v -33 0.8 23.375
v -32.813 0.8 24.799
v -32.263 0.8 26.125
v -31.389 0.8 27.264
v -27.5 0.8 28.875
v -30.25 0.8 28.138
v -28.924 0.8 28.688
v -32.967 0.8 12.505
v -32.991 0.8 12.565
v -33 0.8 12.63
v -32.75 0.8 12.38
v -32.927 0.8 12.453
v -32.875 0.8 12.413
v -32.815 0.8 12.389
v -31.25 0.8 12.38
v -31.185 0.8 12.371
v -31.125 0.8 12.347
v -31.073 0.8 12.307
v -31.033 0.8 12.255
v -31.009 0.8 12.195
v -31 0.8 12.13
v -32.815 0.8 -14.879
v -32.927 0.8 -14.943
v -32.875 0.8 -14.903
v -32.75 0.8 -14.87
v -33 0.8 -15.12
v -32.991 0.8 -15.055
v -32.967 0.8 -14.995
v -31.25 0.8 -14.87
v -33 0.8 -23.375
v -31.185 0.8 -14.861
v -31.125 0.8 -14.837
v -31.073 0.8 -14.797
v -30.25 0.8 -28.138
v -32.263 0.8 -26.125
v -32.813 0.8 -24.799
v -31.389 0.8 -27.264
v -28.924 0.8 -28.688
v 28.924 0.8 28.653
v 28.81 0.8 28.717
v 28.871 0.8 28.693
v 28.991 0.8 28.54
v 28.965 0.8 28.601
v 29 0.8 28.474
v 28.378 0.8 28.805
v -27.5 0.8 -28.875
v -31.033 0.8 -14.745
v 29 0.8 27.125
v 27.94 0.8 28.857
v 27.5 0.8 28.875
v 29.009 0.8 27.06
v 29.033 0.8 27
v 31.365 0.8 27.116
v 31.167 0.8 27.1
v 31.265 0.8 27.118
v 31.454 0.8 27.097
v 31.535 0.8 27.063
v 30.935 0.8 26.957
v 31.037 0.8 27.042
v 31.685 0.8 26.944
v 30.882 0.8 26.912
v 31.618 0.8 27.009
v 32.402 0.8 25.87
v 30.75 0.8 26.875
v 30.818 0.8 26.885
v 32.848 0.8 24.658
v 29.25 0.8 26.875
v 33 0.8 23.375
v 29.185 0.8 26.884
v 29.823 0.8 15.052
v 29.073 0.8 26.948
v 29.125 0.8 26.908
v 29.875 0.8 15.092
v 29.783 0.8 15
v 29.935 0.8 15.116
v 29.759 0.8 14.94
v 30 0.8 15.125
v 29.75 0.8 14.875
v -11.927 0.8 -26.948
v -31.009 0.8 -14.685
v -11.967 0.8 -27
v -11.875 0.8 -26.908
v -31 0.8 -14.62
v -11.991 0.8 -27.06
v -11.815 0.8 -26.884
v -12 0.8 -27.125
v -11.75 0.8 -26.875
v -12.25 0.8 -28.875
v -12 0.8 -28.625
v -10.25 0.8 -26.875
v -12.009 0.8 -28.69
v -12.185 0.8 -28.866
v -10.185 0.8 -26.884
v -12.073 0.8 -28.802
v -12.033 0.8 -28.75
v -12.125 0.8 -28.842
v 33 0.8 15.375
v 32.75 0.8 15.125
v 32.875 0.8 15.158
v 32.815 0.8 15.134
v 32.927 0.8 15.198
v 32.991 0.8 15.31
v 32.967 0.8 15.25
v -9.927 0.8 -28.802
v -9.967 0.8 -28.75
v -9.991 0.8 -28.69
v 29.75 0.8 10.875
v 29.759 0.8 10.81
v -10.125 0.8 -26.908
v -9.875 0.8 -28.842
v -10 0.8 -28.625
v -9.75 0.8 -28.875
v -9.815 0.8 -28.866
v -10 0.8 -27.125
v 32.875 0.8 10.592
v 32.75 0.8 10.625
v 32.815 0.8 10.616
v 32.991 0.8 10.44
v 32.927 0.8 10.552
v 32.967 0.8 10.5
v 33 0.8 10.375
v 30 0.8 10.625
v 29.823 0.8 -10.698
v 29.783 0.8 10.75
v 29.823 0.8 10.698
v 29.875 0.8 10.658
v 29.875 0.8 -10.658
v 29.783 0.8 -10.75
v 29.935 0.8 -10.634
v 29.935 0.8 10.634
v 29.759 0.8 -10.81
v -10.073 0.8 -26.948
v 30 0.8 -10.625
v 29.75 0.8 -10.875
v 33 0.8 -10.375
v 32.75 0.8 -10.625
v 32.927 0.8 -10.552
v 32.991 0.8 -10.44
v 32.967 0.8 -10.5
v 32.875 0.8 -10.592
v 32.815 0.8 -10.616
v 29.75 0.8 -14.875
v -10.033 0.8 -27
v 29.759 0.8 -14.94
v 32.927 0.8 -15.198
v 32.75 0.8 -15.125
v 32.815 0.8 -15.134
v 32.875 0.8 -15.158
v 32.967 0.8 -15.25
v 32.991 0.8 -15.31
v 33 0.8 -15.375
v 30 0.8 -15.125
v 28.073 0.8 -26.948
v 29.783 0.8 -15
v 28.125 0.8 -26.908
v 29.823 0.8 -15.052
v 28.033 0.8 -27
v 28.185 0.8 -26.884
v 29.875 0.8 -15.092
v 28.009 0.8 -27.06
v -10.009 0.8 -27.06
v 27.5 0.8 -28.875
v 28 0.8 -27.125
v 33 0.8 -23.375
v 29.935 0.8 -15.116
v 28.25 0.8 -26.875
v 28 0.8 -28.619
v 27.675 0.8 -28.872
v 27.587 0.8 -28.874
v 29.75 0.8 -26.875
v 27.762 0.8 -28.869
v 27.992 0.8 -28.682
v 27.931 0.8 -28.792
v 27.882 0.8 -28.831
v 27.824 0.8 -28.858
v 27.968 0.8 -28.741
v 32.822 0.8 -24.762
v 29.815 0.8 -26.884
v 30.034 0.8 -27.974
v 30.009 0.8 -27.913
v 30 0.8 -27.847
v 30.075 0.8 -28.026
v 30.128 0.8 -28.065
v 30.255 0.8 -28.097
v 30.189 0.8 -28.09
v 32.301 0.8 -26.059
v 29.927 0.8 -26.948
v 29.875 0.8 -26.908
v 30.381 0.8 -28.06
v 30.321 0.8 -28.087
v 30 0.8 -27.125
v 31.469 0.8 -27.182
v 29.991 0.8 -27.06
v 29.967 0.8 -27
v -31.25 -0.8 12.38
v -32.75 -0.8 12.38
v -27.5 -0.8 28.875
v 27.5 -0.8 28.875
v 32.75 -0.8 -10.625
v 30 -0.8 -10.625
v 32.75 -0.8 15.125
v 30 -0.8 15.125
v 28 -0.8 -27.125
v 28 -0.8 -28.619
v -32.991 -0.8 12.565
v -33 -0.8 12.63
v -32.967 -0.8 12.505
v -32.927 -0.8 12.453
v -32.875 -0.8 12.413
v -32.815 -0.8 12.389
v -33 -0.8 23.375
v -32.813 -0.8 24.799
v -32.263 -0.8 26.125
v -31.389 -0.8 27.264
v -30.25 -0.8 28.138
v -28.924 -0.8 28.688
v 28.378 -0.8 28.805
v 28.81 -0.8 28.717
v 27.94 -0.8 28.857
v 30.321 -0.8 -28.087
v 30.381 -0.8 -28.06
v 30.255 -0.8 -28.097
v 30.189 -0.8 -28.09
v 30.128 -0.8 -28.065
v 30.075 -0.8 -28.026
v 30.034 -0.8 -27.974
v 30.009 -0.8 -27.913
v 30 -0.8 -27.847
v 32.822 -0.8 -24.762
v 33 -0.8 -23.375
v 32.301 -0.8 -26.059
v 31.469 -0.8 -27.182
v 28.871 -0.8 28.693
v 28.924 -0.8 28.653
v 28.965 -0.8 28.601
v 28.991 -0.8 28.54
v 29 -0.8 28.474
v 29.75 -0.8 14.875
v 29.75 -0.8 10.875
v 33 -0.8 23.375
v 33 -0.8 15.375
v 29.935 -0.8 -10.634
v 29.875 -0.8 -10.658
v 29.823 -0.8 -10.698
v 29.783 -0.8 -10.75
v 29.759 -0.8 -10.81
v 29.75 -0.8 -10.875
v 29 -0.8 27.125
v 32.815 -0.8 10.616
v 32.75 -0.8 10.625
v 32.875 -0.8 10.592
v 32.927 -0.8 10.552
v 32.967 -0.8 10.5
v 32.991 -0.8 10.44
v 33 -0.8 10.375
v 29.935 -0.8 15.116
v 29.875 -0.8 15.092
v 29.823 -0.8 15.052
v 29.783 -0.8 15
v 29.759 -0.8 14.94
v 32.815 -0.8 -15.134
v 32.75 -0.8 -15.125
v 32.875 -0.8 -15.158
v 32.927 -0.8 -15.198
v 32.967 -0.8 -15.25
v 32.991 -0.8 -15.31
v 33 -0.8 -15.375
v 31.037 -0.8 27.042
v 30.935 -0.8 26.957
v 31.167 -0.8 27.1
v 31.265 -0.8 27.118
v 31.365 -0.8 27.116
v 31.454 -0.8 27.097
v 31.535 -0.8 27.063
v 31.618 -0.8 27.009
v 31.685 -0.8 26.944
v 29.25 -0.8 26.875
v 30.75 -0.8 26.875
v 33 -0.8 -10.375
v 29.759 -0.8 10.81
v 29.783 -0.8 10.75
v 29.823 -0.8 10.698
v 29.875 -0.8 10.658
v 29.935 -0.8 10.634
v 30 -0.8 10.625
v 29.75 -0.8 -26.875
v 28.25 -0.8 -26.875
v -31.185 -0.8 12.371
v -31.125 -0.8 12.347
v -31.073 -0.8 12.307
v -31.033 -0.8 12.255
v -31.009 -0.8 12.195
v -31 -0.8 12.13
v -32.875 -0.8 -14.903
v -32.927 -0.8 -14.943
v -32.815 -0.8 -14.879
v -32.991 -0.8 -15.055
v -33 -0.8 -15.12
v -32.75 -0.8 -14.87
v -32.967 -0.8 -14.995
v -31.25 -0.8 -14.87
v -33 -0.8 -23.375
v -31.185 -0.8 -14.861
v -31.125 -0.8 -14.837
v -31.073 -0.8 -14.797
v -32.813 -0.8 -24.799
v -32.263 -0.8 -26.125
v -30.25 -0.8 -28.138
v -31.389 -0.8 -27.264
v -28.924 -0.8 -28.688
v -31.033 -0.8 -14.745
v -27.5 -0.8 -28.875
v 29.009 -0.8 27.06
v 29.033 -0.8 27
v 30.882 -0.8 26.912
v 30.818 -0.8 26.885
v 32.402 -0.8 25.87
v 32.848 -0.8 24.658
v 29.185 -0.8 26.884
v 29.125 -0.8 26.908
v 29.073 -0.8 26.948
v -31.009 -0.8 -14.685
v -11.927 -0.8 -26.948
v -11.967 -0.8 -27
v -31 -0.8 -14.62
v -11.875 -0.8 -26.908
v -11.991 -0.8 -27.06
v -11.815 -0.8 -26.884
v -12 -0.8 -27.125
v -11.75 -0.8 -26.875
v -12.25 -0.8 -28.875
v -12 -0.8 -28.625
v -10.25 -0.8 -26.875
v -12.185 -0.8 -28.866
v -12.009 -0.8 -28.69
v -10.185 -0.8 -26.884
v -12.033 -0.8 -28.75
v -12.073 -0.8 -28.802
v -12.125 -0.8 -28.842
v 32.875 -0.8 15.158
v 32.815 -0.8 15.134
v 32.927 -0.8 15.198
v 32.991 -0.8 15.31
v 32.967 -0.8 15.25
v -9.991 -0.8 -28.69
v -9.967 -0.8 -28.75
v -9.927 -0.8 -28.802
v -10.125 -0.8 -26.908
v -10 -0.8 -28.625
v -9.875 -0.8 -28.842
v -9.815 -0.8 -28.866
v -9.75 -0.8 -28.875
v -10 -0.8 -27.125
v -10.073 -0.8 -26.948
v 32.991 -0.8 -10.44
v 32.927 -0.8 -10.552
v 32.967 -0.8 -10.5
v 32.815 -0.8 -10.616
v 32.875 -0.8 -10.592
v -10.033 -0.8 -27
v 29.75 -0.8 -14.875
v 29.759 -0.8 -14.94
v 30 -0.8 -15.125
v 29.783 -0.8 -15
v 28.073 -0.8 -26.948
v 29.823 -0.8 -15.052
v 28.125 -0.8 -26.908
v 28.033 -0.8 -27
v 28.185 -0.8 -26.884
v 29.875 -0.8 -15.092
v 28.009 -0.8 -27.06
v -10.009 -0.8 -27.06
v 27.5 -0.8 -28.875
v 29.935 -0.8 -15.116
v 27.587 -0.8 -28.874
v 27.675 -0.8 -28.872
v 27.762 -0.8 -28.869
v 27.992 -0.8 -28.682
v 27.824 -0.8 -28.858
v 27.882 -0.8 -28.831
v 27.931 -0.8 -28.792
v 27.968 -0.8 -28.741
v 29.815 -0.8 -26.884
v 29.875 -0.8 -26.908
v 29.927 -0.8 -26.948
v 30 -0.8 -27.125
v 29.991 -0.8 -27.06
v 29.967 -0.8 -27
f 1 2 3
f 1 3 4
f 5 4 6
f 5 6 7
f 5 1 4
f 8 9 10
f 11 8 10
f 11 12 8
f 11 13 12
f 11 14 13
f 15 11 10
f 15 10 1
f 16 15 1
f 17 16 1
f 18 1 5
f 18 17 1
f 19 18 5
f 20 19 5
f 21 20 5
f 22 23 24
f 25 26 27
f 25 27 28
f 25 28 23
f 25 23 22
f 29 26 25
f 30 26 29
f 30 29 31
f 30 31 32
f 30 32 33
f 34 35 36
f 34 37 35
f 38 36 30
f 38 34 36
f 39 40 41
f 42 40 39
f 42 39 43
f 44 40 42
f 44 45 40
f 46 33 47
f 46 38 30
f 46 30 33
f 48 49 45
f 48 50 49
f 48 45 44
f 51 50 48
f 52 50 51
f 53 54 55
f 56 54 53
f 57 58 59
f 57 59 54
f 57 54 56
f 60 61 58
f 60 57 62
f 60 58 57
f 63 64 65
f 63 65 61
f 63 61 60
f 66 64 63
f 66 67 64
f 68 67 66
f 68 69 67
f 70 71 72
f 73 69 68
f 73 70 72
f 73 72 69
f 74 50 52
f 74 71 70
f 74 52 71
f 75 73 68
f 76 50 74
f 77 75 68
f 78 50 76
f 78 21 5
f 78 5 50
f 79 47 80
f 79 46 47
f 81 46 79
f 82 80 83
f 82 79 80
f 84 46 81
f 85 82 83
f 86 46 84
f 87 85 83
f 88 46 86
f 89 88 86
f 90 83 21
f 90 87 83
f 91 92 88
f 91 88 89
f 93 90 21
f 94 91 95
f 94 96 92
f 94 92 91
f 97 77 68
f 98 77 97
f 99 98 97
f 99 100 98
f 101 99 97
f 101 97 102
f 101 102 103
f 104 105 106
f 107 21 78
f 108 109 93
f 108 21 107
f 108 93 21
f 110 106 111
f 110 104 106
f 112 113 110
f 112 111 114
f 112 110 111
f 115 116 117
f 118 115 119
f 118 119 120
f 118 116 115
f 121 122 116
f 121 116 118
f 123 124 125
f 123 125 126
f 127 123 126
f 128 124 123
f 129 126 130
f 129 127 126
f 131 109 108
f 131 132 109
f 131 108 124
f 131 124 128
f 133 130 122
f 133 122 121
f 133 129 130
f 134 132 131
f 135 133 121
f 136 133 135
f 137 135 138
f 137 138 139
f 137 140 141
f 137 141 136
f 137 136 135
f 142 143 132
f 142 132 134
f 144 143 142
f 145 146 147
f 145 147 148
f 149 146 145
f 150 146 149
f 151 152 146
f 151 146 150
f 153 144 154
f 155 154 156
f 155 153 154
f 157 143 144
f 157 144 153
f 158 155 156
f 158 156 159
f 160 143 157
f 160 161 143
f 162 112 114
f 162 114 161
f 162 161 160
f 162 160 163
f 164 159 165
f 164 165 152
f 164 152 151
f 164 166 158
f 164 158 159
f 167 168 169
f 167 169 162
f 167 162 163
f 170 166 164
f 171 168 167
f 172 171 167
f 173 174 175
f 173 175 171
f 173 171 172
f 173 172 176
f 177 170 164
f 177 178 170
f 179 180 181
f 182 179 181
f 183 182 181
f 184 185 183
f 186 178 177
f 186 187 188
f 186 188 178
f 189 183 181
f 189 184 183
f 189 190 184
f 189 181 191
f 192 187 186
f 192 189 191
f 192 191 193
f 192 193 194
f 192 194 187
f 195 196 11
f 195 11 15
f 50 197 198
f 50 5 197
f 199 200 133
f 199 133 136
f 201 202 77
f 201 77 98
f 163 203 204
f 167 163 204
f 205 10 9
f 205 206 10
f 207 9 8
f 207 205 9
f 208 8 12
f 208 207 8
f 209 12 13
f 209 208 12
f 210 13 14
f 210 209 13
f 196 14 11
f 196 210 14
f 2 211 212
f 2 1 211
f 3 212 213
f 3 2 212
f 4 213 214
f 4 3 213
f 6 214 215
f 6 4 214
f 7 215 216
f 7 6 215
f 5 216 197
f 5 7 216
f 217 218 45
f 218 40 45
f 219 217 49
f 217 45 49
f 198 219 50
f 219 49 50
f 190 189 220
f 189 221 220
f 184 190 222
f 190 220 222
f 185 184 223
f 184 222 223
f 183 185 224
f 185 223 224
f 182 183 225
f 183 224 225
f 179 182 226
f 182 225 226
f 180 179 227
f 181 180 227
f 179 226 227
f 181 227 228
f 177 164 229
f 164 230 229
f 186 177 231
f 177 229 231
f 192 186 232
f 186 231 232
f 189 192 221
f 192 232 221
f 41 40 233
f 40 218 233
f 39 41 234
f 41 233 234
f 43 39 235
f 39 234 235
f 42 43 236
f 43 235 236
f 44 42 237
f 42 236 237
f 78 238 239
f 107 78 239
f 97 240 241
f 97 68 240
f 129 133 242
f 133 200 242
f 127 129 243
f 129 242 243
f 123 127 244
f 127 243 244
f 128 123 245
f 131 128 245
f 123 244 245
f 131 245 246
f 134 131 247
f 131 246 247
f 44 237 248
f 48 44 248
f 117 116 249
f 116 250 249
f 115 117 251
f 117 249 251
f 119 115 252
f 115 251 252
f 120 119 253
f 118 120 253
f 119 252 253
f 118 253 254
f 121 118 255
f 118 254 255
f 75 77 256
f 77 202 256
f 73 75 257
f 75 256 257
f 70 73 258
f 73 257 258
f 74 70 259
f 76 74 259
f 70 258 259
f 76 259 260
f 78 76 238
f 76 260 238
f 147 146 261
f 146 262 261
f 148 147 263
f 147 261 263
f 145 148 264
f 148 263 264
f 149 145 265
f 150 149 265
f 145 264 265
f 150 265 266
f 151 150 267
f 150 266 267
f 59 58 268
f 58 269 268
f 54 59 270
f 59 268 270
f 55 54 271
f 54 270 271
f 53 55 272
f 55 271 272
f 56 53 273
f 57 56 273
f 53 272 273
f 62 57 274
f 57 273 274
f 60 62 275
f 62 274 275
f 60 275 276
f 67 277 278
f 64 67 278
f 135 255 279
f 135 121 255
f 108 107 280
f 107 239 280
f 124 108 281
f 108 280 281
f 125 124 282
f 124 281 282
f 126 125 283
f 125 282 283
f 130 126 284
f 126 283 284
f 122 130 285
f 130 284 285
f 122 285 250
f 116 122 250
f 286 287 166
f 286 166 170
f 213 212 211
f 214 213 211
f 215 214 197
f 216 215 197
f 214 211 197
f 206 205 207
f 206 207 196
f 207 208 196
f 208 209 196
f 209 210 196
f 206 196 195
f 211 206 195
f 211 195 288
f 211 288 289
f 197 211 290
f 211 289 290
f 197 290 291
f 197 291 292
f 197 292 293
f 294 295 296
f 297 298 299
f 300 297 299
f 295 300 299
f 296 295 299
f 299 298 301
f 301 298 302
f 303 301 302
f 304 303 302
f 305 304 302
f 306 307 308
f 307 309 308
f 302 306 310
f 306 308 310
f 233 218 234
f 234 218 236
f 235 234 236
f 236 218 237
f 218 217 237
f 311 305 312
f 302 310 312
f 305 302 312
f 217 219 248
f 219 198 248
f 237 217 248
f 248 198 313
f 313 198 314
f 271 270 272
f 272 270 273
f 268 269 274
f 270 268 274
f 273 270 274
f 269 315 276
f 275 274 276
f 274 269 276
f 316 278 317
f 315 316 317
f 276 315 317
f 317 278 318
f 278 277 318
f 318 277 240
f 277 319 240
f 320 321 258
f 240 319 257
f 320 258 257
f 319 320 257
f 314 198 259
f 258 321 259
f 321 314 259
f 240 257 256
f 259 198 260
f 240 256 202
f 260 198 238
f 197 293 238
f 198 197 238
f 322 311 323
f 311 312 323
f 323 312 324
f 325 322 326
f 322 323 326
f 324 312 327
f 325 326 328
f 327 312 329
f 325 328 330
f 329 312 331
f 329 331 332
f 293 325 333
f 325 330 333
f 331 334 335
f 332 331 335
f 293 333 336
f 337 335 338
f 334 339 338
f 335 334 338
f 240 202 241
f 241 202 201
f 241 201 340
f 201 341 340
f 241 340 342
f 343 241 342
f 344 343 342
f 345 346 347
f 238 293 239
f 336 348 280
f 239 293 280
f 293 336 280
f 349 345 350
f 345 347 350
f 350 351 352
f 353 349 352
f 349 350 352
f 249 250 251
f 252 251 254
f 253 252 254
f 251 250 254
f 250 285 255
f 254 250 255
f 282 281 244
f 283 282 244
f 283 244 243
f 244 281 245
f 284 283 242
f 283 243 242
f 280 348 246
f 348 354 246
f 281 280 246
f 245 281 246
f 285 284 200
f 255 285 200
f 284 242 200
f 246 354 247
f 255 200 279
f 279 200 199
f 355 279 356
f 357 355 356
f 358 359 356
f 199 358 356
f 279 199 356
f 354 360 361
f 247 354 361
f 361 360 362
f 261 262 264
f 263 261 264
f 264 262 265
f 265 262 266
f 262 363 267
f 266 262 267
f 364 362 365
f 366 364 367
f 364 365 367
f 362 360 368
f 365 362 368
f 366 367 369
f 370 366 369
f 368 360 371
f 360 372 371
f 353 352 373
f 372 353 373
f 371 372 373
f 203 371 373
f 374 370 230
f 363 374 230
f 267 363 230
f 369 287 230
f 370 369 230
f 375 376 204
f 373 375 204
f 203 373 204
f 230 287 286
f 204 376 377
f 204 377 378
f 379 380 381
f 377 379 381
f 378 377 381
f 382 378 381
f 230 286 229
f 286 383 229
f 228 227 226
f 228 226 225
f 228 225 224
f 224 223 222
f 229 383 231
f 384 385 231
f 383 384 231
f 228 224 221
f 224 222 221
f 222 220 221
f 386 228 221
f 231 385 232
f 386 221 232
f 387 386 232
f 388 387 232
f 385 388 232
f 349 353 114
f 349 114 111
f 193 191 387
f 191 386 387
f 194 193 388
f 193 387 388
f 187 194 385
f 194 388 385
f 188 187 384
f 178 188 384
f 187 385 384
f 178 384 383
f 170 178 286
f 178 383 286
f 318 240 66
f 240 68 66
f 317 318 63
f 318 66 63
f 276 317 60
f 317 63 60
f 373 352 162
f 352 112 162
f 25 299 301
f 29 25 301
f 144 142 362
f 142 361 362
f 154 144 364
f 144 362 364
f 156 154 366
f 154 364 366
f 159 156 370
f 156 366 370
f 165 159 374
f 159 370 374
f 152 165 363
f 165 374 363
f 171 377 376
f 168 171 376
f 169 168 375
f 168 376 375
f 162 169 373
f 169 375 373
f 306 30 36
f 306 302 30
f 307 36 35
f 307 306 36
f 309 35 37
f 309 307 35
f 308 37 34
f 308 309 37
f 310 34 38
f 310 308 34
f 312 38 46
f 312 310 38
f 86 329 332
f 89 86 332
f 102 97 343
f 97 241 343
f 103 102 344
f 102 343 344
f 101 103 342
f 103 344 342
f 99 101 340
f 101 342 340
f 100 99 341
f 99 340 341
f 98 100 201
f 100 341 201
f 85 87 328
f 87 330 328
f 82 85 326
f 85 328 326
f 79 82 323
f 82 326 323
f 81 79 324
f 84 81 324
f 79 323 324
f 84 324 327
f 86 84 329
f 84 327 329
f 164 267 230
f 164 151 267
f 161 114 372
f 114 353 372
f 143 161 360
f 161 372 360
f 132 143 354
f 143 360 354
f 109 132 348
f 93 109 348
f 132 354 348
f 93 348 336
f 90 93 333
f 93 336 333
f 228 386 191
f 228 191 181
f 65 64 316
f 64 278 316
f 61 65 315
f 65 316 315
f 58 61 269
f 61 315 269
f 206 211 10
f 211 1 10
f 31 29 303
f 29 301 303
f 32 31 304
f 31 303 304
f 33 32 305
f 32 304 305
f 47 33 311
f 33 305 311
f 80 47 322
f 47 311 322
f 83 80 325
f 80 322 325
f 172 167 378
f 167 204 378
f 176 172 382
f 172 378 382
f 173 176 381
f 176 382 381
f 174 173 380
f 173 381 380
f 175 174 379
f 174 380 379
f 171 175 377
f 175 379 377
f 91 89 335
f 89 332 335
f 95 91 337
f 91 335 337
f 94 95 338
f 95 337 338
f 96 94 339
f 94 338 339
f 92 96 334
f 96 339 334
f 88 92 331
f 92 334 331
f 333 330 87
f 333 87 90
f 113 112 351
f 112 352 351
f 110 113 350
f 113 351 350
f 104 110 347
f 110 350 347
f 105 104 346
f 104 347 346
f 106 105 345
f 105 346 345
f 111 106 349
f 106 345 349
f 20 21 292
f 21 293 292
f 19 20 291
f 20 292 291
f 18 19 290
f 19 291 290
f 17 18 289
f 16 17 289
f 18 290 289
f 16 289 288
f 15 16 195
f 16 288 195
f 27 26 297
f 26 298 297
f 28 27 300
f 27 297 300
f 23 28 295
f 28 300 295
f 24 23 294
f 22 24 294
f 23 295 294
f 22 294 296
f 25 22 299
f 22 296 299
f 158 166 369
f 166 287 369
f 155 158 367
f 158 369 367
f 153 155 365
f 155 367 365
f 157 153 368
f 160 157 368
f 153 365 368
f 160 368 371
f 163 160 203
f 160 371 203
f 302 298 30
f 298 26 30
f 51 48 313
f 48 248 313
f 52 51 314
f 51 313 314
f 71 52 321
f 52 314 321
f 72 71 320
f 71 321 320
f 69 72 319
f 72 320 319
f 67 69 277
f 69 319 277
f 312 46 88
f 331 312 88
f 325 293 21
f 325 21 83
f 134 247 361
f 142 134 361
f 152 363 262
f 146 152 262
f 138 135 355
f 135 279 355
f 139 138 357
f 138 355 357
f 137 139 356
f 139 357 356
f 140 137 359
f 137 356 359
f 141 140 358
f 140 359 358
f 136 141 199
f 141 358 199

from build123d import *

# Parameters (mm, degrees)
ESQUISSE1_W                  = 66
ESQUISSE1_H                  = 57.75
BOSS_EXTRU_1_DEPTH           = 0.8
CONG_1_R                     = 5.5
ESQUISSE3_W                  = 4
ESQUISSE3_H                  = 27.25
ESQUISSE3_W_2                = 6.5
ESQUISSE3_H_2                = 4.5
ESQUISSE3_W_3                = 2
ESQUISSE3_H_3                = 4
ENL_V_MAT_EXTRU_1_DEPTH      = 1.8
ENL_V_MAT_EXTRU_1_DEPTH_BACK = 1.8
CONG_2_R                     = 0.25
CONG_3_R                     = 0.5


with BuildPart() as part:
    # Esquisse1 → Boss.-Extru.1 (new body, symmetric)
    with BuildSketch(Plane(origin=(0, 0, 0), x_dir=(1, 0, 0), z_dir=(0, 1, 0))):
        Rectangle(ESQUISSE1_W, ESQUISSE1_H)
    extrude(amount=BOSS_EXTRU_1_DEPTH, both=True)

    # Congé1
    cong_1_edges = [part.edges().sort_by_distance(p)[0] for p in [
        (33, 0, 28.875),
        (-33, 0, 28.875),
        (-33, 0, -28.875),
        (33, 0, -28.875),
    ]]
    fillet(cong_1_edges, radius=CONG_1_R)

    # Esquisse3 → Enlèv. mat.-Extru.1 (cut, two sides)
    with BuildSketch(Plane(origin=(0, 0, 0), x_dir=(1, 0, 0), z_dir=(0, 1, 0))) as enl_v_mat_extru_1_sk:
        with Locations((-33, 1.245)):
            Rectangle(ESQUISSE3_W, ESQUISSE3_H)
        with Locations((33, -12.875)):
            Rectangle(ESQUISSE3_W_2, ESQUISSE3_H_2)
        with Locations((-11, 28.875)):
            Rectangle(ESQUISSE3_W_3, ESQUISSE3_H_3)
        with Locations((29, 28.875)):
            Rectangle(ESQUISSE3_W_3, ESQUISSE3_H_3)
        with Locations((30, -28.875)):
            Rectangle(ESQUISSE3_W_3, ESQUISSE3_H_3)
        with Locations((33, 12.875)):
            Rectangle(ESQUISSE3_W_2, ESQUISSE3_H_2)
    extrude(amount=ENL_V_MAT_EXTRU_1_DEPTH, mode=Mode.SUBTRACT)
    extrude(enl_v_mat_extru_1_sk.sketch, amount=-ENL_V_MAT_EXTRU_1_DEPTH_BACK, mode=Mode.SUBTRACT)

    # Congé2
    cong_2_edges = [part.edges().sort_by_distance(p)[0] for p in [
        (30, 0, -26.875),
        (28, 0, -26.875),
        (33, 0, 10.625),
        (29.75, 0, 10.625),
        (33, 0, 15.125),
        (29.75, 0, 15.125),
        (29, 0, 28.666502622),
        (28, 0, -28.852225575),
        (30, 0, -28.273979486),
        (-33, 0, 12.38),
        (-31, 0, 12.38),
        (-33, 0, -14.87),
        (-31, 0, -14.87),
        (33, 0, -10.625),
        (33, 0, -15.125),
        (29.75, 0, -15.125),
        (29.75, 0, -10.625),
        (-10, 0, -28.875),
        (-12, 0, -28.875),
        (-12, 0, -26.875),
        (-10, 0, -26.875),
        (31, 0, 26.875),
        (29, 0, 26.875),
    ]]
    fillet(cong_2_edges, radius=CONG_2_R)

    # Congé3
    cong_3_edges = [part.edges().sort_by_distance(p)[0] for p in [
        (31, 0, 27.617640687),
    ]]
    fillet(cong_3_edges, radius=CONG_3_R)


solid = part.part
